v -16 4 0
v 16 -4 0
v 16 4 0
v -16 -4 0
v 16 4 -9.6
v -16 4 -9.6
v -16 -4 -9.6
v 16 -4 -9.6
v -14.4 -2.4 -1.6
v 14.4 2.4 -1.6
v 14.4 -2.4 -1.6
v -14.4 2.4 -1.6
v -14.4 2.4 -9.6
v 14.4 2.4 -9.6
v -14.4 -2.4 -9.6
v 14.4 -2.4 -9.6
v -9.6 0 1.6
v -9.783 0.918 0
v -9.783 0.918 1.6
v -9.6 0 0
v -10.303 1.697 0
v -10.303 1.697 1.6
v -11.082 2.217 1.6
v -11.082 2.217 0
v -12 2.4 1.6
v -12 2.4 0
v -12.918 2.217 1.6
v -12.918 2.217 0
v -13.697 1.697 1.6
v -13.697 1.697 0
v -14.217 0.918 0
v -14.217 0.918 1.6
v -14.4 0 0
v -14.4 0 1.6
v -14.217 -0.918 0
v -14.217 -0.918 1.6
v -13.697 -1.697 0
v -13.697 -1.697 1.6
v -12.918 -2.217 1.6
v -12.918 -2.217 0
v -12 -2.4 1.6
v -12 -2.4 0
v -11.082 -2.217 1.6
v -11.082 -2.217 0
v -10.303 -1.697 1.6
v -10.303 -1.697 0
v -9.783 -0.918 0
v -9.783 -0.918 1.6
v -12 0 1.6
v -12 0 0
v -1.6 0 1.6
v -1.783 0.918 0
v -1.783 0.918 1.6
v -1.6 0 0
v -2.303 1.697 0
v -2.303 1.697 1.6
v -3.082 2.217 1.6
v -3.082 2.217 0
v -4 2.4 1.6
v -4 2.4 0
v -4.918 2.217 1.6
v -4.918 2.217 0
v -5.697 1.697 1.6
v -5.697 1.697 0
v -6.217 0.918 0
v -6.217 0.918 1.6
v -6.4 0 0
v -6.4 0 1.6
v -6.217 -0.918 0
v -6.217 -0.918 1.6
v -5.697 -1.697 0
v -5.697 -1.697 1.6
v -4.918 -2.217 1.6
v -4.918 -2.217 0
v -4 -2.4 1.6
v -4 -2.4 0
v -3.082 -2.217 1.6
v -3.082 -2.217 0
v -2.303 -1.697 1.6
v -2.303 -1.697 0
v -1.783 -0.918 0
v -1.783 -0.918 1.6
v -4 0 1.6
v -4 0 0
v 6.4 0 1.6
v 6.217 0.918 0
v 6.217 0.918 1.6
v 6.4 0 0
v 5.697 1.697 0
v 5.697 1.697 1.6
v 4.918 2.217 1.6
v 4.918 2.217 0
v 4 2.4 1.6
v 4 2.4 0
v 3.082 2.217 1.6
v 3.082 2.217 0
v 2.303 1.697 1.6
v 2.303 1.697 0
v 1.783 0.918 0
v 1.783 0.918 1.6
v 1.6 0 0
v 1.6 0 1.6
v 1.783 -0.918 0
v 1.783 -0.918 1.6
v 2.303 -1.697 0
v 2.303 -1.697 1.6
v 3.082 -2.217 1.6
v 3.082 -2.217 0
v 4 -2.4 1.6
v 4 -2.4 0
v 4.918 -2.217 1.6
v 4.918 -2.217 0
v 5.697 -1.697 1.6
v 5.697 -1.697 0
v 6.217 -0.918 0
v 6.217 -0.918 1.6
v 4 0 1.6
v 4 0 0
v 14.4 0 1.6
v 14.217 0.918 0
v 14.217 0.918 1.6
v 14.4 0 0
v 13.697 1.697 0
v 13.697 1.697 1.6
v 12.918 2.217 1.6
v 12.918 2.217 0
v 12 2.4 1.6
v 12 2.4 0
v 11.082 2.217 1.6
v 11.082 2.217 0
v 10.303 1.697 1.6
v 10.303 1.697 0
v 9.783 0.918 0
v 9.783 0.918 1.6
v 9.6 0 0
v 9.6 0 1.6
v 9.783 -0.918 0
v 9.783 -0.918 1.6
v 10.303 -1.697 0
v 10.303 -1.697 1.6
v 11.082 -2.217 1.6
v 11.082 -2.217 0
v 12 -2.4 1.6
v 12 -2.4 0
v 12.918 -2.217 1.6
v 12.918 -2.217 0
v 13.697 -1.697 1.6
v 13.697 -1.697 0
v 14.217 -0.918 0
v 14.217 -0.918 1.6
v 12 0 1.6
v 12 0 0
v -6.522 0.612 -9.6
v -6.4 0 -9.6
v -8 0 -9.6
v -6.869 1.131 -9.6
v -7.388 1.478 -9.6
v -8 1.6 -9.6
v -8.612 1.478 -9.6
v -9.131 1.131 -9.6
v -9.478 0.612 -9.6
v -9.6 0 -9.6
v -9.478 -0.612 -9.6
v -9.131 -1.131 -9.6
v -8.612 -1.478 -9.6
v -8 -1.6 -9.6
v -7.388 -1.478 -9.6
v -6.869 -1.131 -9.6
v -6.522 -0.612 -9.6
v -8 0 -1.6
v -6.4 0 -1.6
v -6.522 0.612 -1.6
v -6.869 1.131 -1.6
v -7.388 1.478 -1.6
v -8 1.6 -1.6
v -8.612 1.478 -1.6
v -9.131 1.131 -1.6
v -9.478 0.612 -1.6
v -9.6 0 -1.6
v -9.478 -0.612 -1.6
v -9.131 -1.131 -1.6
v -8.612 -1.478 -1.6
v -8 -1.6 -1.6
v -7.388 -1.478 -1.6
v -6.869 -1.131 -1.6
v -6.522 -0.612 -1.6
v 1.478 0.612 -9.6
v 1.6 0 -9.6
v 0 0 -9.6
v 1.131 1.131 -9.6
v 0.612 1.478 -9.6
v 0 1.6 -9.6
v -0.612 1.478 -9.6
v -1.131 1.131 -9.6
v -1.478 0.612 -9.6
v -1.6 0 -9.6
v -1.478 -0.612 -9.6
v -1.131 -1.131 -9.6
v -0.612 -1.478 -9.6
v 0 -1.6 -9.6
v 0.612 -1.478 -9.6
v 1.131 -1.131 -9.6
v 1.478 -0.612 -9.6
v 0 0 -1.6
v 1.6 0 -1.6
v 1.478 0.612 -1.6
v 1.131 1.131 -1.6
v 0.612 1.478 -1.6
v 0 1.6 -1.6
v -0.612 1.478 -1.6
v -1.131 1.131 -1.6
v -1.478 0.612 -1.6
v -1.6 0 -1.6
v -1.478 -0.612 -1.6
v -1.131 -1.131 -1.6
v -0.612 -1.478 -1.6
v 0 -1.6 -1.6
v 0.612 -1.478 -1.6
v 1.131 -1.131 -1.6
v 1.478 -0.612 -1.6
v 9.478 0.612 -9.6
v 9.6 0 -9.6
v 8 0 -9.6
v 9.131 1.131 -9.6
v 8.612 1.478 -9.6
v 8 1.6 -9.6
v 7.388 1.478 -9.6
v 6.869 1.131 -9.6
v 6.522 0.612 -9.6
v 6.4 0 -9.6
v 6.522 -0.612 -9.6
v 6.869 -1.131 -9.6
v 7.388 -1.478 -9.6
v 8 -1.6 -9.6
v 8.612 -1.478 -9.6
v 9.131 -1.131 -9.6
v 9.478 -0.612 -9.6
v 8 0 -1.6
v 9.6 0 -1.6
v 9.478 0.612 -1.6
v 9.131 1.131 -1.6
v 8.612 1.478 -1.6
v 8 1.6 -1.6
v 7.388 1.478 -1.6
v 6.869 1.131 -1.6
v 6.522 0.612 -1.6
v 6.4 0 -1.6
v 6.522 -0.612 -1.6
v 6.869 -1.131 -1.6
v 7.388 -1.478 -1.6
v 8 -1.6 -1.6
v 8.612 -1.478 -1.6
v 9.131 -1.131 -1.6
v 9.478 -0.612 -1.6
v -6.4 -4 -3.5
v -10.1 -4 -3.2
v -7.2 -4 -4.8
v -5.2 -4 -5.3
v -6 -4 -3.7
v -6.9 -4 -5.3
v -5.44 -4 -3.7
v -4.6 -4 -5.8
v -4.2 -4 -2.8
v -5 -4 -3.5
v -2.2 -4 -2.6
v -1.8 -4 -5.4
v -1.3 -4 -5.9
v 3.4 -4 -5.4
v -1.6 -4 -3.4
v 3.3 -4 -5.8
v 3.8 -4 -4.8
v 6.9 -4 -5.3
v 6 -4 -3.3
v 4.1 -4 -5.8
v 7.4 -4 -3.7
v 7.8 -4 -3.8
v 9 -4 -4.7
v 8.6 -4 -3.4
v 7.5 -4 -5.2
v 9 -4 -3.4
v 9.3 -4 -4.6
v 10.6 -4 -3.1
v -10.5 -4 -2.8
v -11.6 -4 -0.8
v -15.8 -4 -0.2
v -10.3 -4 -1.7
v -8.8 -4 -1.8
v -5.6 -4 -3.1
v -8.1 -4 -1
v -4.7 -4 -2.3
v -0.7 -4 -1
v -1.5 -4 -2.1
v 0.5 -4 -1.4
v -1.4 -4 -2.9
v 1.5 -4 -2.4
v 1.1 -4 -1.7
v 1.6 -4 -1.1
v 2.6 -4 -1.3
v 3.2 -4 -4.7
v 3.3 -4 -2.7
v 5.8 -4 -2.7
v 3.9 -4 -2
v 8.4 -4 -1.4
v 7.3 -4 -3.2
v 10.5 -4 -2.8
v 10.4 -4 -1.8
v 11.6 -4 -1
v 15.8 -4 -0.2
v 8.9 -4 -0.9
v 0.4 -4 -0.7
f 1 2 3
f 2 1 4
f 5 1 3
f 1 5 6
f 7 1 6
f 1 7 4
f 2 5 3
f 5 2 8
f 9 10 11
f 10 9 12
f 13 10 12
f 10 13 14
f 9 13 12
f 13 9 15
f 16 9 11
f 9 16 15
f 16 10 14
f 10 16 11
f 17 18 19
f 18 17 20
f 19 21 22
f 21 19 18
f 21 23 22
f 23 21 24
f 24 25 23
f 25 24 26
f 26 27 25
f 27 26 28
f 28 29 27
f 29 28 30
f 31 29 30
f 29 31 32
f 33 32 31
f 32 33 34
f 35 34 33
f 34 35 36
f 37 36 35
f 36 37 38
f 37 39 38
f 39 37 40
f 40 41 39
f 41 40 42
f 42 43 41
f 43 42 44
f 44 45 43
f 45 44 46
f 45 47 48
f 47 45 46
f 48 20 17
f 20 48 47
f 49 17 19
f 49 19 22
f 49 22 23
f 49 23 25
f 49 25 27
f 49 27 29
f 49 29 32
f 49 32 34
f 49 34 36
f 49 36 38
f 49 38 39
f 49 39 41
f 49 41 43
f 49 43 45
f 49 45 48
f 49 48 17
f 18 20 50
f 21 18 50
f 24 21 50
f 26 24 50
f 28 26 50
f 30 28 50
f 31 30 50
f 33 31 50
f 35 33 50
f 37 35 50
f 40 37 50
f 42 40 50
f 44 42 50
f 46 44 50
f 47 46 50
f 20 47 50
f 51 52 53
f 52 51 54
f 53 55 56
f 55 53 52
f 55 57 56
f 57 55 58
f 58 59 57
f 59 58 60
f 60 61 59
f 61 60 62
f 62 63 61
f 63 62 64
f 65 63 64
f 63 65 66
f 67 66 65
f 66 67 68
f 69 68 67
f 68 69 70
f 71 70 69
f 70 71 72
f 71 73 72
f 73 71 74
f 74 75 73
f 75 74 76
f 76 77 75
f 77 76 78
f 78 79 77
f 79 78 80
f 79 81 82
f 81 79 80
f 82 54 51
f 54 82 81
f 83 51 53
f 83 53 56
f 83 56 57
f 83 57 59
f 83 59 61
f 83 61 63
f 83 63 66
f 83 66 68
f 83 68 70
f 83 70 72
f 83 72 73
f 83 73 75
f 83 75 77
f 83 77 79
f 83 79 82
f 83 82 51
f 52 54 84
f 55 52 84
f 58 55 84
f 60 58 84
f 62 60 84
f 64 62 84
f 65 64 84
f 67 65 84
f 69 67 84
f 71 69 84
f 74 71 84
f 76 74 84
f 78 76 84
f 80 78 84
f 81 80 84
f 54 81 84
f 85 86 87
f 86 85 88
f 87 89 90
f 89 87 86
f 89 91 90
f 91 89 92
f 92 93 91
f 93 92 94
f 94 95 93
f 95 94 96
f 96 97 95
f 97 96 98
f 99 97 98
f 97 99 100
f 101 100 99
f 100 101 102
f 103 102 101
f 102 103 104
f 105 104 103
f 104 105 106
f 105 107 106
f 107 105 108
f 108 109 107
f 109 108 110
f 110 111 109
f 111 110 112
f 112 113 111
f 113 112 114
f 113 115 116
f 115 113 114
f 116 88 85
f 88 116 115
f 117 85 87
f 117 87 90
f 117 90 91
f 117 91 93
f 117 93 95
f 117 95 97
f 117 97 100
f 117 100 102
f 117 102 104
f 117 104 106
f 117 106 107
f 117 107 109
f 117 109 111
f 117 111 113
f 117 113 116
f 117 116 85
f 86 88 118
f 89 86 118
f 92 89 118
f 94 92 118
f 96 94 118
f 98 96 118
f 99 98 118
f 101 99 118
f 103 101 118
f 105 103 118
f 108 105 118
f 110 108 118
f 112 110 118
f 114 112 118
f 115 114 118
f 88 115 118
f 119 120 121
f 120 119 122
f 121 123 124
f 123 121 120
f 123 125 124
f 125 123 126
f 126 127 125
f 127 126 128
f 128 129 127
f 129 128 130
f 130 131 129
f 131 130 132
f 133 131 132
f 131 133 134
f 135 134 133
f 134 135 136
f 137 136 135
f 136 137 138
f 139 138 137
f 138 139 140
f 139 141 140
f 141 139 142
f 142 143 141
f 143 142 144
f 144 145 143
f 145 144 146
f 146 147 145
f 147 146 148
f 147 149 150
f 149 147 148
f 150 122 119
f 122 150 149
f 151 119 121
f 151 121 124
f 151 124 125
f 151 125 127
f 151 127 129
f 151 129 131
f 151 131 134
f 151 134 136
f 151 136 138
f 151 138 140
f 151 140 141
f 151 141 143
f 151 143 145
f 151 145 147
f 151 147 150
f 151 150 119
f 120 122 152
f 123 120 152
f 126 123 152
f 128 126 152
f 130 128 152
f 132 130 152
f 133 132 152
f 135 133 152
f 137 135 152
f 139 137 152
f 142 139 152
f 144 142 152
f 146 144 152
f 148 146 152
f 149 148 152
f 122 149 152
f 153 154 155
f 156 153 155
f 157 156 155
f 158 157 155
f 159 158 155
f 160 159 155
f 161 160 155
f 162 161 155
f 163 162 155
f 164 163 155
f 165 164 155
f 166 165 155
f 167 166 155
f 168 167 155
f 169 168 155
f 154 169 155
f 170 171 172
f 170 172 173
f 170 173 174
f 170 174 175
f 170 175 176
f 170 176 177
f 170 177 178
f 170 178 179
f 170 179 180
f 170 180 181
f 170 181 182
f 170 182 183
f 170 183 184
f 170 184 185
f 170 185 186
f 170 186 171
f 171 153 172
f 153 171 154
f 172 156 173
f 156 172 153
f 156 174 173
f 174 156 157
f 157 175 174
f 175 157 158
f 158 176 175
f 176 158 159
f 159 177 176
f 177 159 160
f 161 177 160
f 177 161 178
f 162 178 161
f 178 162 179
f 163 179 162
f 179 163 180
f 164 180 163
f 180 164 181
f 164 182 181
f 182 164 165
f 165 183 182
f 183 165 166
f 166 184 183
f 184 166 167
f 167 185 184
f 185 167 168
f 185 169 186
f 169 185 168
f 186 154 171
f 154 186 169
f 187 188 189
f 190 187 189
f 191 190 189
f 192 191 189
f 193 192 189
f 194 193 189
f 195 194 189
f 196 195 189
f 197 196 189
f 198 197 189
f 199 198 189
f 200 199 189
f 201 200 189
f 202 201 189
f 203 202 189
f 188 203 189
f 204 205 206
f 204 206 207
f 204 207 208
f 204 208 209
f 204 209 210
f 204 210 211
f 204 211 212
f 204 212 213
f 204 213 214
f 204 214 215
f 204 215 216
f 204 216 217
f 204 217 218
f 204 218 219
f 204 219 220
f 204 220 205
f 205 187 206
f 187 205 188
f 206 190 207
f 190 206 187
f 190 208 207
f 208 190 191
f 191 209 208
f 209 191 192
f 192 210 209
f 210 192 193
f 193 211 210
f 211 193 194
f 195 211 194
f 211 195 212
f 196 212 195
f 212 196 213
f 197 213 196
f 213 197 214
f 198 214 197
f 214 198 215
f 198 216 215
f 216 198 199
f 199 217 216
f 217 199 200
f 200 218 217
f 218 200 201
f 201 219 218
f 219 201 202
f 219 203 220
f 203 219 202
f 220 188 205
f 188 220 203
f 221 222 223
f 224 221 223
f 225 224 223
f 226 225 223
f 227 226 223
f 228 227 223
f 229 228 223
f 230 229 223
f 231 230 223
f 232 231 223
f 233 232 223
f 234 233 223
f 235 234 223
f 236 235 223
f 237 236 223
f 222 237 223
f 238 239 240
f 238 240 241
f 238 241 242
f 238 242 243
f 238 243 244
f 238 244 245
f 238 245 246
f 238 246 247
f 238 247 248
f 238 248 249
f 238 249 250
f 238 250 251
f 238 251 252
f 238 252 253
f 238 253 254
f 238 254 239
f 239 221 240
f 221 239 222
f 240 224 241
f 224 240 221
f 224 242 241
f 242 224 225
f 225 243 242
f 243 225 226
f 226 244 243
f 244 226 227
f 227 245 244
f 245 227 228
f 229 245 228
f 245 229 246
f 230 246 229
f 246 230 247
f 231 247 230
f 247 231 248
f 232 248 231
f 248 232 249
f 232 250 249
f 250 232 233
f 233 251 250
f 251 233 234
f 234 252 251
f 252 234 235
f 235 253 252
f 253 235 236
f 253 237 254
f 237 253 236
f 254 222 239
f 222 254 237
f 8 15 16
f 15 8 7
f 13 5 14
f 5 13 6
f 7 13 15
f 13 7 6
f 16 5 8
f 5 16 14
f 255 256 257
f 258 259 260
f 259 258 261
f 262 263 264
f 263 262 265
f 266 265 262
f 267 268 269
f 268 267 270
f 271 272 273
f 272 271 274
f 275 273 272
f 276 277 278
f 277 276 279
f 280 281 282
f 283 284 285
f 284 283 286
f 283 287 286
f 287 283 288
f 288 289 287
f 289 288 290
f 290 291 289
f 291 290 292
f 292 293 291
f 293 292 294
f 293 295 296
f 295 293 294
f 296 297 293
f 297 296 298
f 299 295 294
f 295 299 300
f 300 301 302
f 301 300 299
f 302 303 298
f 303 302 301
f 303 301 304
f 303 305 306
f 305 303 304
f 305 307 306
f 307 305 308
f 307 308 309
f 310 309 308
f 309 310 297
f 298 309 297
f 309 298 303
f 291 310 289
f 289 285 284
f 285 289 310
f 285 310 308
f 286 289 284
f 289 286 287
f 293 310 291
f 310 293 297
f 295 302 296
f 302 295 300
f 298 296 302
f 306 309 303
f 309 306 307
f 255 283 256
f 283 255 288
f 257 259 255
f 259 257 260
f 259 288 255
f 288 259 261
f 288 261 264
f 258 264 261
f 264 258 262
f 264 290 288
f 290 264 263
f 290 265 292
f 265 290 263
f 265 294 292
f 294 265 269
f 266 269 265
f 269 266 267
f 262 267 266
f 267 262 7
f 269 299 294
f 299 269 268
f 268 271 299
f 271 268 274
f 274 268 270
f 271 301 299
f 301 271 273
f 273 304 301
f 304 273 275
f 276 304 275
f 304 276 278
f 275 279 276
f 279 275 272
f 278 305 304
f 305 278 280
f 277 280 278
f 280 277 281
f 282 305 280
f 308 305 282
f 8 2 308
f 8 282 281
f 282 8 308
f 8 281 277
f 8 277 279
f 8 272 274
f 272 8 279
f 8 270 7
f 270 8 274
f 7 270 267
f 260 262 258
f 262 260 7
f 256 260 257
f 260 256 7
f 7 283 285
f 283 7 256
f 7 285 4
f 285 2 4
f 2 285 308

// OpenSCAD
// file: ../p/4-4edge.scad
use <../lib.scad>
function ldraw_lib__4_4edge() = [
// 0 Circle 1.0
// 0 Name: 4-4edge.dat
// 0 Author: James Jessiman
// 0 !LDRAW_ORG Primitive UPDATE 2017-01
// 0 !LICENSE Licensed under CC BY 2.0 and CC BY 4.0 : see CAreadme.txt
// 
// 0 BFC CERTIFY CCW
  [0,"BFC","CERTIFY"],
  [0,"BFC","CCW"],
// 
// 0 !HISTORY 1998-12-15 [PTadmin] Official Update 1998-10
// 0 !HISTORY 2005-12-28 [PTadmin] Official Update 2005-01
// 0 !HISTORY 2007-06-24 [PTadmin] Header formatted for Contributor Agreement
// 0 !HISTORY 2008-07-01 [PTadmin] Official Update 2008-01
// 0 !HISTORY 2017-01-15 [Steffen] BFCed
// 0 !HISTORY 2017-12-30 [PTadmin] Official Update 2017-01
// 
// 
// 2 24 1 0 0 0.9239 0 0.3827
  [2,24,1,0,0,0.9239,0,0.3827],
// 2 24 0.9239 0 0.3827 0.7071 0 0.7071
  [2,24,0.9239,0,0.3827,0.7071,0,0.7071],
// 2 24 0.7071 0 0.7071 0.3827 0 0.9239
  [2,24,0.7071,0,0.7071,0.3827,0,0.9239],
// 2 24 0.3827 0 0.9239 0 0 1
  [2,24,0.3827,0,0.9239,0,0,1],
// 2 24 0 0 1 -0.3827 0 0.9239
  [2,24,0,0,1,-0.3827,0,0.9239],
// 2 24 -0.3827 0 0.9239 -0.7071 0 0.7071
  [2,24,-0.3827,0,0.9239,-0.7071,0,0.7071],
// 2 24 -0.7071 0 0.7071 -0.9239 0 0.3827
  [2,24,-0.7071,0,0.7071,-0.9239,0,0.3827],
// 2 24 -0.9239 0 0.3827 -1 0 -0
  [2,24,-0.9239,0,0.3827,-1,0,-0],
// 2 24 -1 0 -0 -0.9239 0 -0.3827
  [2,24,-1,0,-0,-0.9239,0,-0.3827],
// 2 24 -0.9239 0 -0.3827 -0.7071 0 -0.7071
  [2,24,-0.9239,0,-0.3827,-0.7071,0,-0.7071],
// 2 24 -0.7071 0 -0.7071 -0.3827 0 -0.9239
  [2,24,-0.7071,0,-0.7071,-0.3827,0,-0.9239],
// 2 24 -0.3827 0 -0.9239 0 0 -1
  [2,24,-0.3827,0,-0.9239,0,0,-1],
// 2 24 0 0 -1 0.3827 0 -0.9239
  [2,24,0,0,-1,0.3827,0,-0.9239],
// 2 24 0.3827 0 -0.9239 0.7071 0 -0.7071
  [2,24,0.3827,0,-0.9239,0.7071,0,-0.7071],
// 2 24 0.7071 0 -0.7071 0.9239 0 -0.3827
  [2,24,0.7071,0,-0.7071,0.9239,0,-0.3827],
// 2 24 0.9239 0 -0.3827 1 0 0
  [2,24,0.9239,0,-0.3827,1,0,0],
];
module ldraw_lib__4_4edge(step=0, col=false, unit=2/5, alt=false, line=0.2, solid=!$preview)
    makepoly(ldraw_lib__4_4edge(), step=step, col=col, unit=unit, alt=alt, line=line, solid=solid);
ldraw_lib__4_4edge(line=0.2);
// file: ../p/4-4disc.scad
use <../lib.scad>
function ldraw_lib__4_4disc() = [
// 0 Disc 1.0
// 0 Name: 4-4disc.dat
// 0 Author: James Jessiman
// 0 !LDRAW_ORG Primitive UPDATE 2002-02
// 0 !LICENSE Licensed under CC BY 2.0 and CC BY 4.0 : see CAreadme.txt
// 
// 0 BFC CERTIFY CCW
  [0,"BFC","CERTIFY"],
  [0,"BFC","CCW"],
// 
// 0 !HISTORY 1998-12-15 [PTadmin] Official Update 1998-10
// 0 !HISTORY 2002-03-23 [sbliss] Added BFC statement
// 0 !HISTORY 2002-04-25 [PTadmin] Official Update 2002-02
// 0 !HISTORY 2007-06-24 [PTadmin] Header formatted for Contributor Agreement
// 0 !HISTORY 2008-07-01 [PTadmin] Official Update 2008-01
// 
// 
// 3 16 0 0 0 1 0 0 0.9239 0 0.3827
  [3,16,0,0,0,1,0,0,0.9239,0,0.3827],
// 3 16 0 0 0 0.9239 0 0.3827 0.7071 0 0.7071
  [3,16,0,0,0,0.9239,0,0.3827,0.7071,0,0.7071],
// 3 16 0 0 0 0.7071 0 0.7071 0.3827 0 0.9239
  [3,16,0,0,0,0.7071,0,0.7071,0.3827,0,0.9239],
// 3 16 0 0 0 0.3827 0 0.9239 0 0 1
  [3,16,0,0,0,0.3827,0,0.9239,0,0,1],
// 3 16 0 0 0 0 0 1 -0.3827 0 0.9239
  [3,16,0,0,0,0,0,1,-0.3827,0,0.9239],
// 3 16 0 0 0 -0.3827 0 0.9239 -0.7071 0 0.7071
  [3,16,0,0,0,-0.3827,0,0.9239,-0.7071,0,0.7071],
// 3 16 0 0 0 -0.7071 0 0.7071 -0.9239 0 0.3827
  [3,16,0,0,0,-0.7071,0,0.7071,-0.9239,0,0.3827],
// 3 16 0 0 0 -0.9239 0 0.3827 -1 0 -0
  [3,16,0,0,0,-0.9239,0,0.3827,-1,0,-0],
// 3 16 0 0 0 -1 0 -0 -0.9239 0 -0.3827
  [3,16,0,0,0,-1,0,-0,-0.9239,0,-0.3827],
// 3 16 0 0 0 -0.9239 0 -0.3827 -0.7071 0 -0.7071
  [3,16,0,0,0,-0.9239,0,-0.3827,-0.7071,0,-0.7071],
// 3 16 0 0 0 -0.7071 0 -0.7071 -0.3827 0 -0.9239
  [3,16,0,0,0,-0.7071,0,-0.7071,-0.3827,0,-0.9239],
// 3 16 0 0 0 -0.3827 0 -0.9239 0 0 -1
  [3,16,0,0,0,-0.3827,0,-0.9239,0,0,-1],
// 3 16 0 0 0 0 0 -1 0.3827 0 -0.9239
  [3,16,0,0,0,0,0,-1,0.3827,0,-0.9239],
// 3 16 0 0 0 0.3827 0 -0.9239 0.7071 0 -0.7071
  [3,16,0,0,0,0.3827,0,-0.9239,0.7071,0,-0.7071],
// 3 16 0 0 0 0.7071 0 -0.7071 0.9239 0 -0.3827
  [3,16,0,0,0,0.7071,0,-0.7071,0.9239,0,-0.3827],
// 3 16 0 0 0 0.9239 0 -0.3827 1 0 0
  [3,16,0,0,0,0.9239,0,-0.3827,1,0,0],
// 0
];
module ldraw_lib__4_4disc(step=0, col=false, unit=2/5, alt=false, line=0.2, solid=!$preview)
    makepoly(ldraw_lib__4_4disc(), step=step, col=col, unit=unit, alt=alt, line=line, solid=solid);
ldraw_lib__4_4disc(line=0.2);
// file: ../p/4-4cyli.scad
use <../lib.scad>
$fa=1; $fs=0.2;
function ldraw_lib__4_4cyli(realsolid=false) = [
// 0 Cylinder 1.0
// 0 Name: 4-4cyli.dat
// 0 Author: James Jessiman
// 0 !LDRAW_ORG Primitive UPDATE 2005-01
// 0 !LICENSE Licensed under CC BY 2.0 and CC BY 4.0 : see CAreadme.txt
// 
// 0 BFC CERTIFY CCW
  [0,"BFC","CERTIFY"],
  [0,"BFC","CCW"],
// 
// 0 !HISTORY 1998-12-15 [PTadmin] Official Update 1998-10
// 0 !HISTORY 2002-03-23 [sbliss] Added BFC statement; merged headers from files in distributions LDraw 0.27 and Complete.
// 0 !HISTORY 2002-04-25 [PTadmin] Official Update 2002-02
// 0 !HISTORY 2004-12-14 [guyvivan] BFC CCW
// 0 !HISTORY 2005-12-28 [PTadmin] Official Update 2005-01
// 0 !HISTORY 2007-06-24 [PTadmin] Header formatted for Contributor Agreement
// 0 !HISTORY 2008-07-01 [PTadmin] Official Update 2008-01
// 
// 
// 4 16 1 1 0 0.9239 1 0.3827 0.9239 0 0.3827 1 0 0
  [4,16,1,1,0,0.9239,1,0.3827,0.9239,0,0.3827,1,0,0],
// 5 24 1 0 0 1 1 0 0.9239 0 0.3827 0.9239 0 -0.3827
  [5,24,1,0,0,1,1,0,0.9239,0,0.3827,0.9239,0,-0.3827],
// 4 16 0.9239 1 0.3827 0.7071 1 0.7071 0.7071 0 0.7071 0.9239 0 0.3827
  [4,16,0.9239,1,0.3827,0.7071,1,0.7071,0.7071,0,0.7071,0.9239,0,0.3827],
// 5 24 0.9239 0 0.3827 0.9239 1 0.3827 0.7071 0 0.7071 1 0 0
  [5,24,0.9239,0,0.3827,0.9239,1,0.3827,0.7071,0,0.7071,1,0,0],
// 4 16 0.7071 1 0.7071 0.3827 1 0.9239 0.3827 0 0.9239 0.7071 0 0.7071
  [4,16,0.7071,1,0.7071,0.3827,1,0.9239,0.3827,0,0.9239,0.7071,0,0.7071],
// 5 24 0.7071 0 0.7071 0.7071 1 0.7071 0.3827 0 0.9239 0.9239 0 0.3827
  [5,24,0.7071,0,0.7071,0.7071,1,0.7071,0.3827,0,0.9239,0.9239,0,0.3827],
// 4 16 0.3827 1 0.9239 0 1 1 0 0 1 0.3827 0 0.9239
  [4,16,0.3827,1,0.9239,0,1,1,0,0,1,0.3827,0,0.9239],
// 5 24 0.3827 0 0.9239 0.3827 1 0.9239 0 0 1 0.7071 0 0.7071
  [5,24,0.3827,0,0.9239,0.3827,1,0.9239,0,0,1,0.7071,0,0.7071],
// 4 16 0 1 1 -0.3827 1 0.9239 -0.3827 0 0.9239 0 0 1
  [4,16,0,1,1,-0.3827,1,0.9239,-0.3827,0,0.9239,0,0,1],
// 5 24 0 0 1 0 1 1 -0.3827 0 0.9239 0.3827 0 0.9239
  [5,24,0,0,1,0,1,1,-0.3827,0,0.9239,0.3827,0,0.9239],
// 4 16 -0.3827 1 0.9239 -0.7071 1 0.7071 -0.7071 0 0.7071 -0.3827 0 0.9239
  [4,16,-0.3827,1,0.9239,-0.7071,1,0.7071,-0.7071,0,0.7071,-0.3827,0,0.9239],
// 5 24 -0.3827 0 0.9239 -0.3827 1 0.9239 -0.7071 0 0.7071 0 0 1
  [5,24,-0.3827,0,0.9239,-0.3827,1,0.9239,-0.7071,0,0.7071,0,0,1],
// 4 16 -0.7071 1 0.7071 -0.9239 1 0.3827 -0.9239 0 0.3827 -0.7071 0 0.7071
  [4,16,-0.7071,1,0.7071,-0.9239,1,0.3827,-0.9239,0,0.3827,-0.7071,0,0.7071],
// 5 24 -0.7071 0 0.7071 -0.7071 1 0.7071 -0.9239 0 0.3827 -0.3827 0 0.9239
  [5,24,-0.7071,0,0.7071,-0.7071,1,0.7071,-0.9239,0,0.3827,-0.3827,0,0.9239],
// 4 16 -0.9239 1 0.3827 -1 1 0 -1 0 0 -0.9239 0 0.3827
  [4,16,-0.9239,1,0.3827,-1,1,0,-1,0,0,-0.9239,0,0.3827],
// 5 24 -0.9239 0 0.3827 -0.9239 1 0.3827 -1 0 0 -0.7071 0 0.7071
  [5,24,-0.9239,0,0.3827,-0.9239,1,0.3827,-1,0,0,-0.7071,0,0.7071],
// 4 16 -1 1 0 -0.9239 1 -0.3827 -0.9239 0 -0.3827 -1 0 0
  [4,16,-1,1,0,-0.9239,1,-0.3827,-0.9239,0,-0.3827,-1,0,0],
// 5 24 -1 0 0 -1 1 0 -0.9239 0 -0.3827 -0.9239 0 0.3827
  [5,24,-1,0,0,-1,1,0,-0.9239,0,-0.3827,-0.9239,0,0.3827],
// 4 16 -0.9239 1 -0.3827 -0.7071 1 -0.7071 -0.7071 0 -0.7071 -0.9239 0 -0.3827
  [4,16,-0.9239,1,-0.3827,-0.7071,1,-0.7071,-0.7071,0,-0.7071,-0.9239,0,-0.3827],
// 5 24 -0.9239 0 -0.3827 -0.9239 1 -0.3827 -0.7071 0 -0.7071 -1 0 0
  [5,24,-0.9239,0,-0.3827,-0.9239,1,-0.3827,-0.7071,0,-0.7071,-1,0,0],
// 4 16 -0.7071 1 -0.7071 -0.3827 1 -0.9239 -0.3827 0 -0.9239 -0.7071 0 -0.7071
  [4,16,-0.7071,1,-0.7071,-0.3827,1,-0.9239,-0.3827,0,-0.9239,-0.7071,0,-0.7071],
// 5 24 -0.7071 0 -0.7071 -0.7071 1 -0.7071 -0.3827 0 -0.9239 -0.9239 0 -0.3827
  [5,24,-0.7071,0,-0.7071,-0.7071,1,-0.7071,-0.3827,0,-0.9239,-0.9239,0,-0.3827],
// 4 16 -0.3827 1 -0.9239 0 1 -1 0 0 -1 -0.3827 0 -0.9239
  [4,16,-0.3827,1,-0.9239,0,1,-1,0,0,-1,-0.3827,0,-0.9239],
// 5 24 -0.3827 0 -0.9239 -0.3827 1 -0.9239 0 0 -1 -0.7071 0 -0.7071
  [5,24,-0.3827,0,-0.9239,-0.3827,1,-0.9239,0,0,-1,-0.7071,0,-0.7071],
// 4 16 0 1 -1 0.3827 1 -0.9239 0.3827 0 -0.9239 0 0 -1
  [4,16,0,1,-1,0.3827,1,-0.9239,0.3827,0,-0.9239,0,0,-1],
// 5 24 0 0 -1 0 1 -1 0.3827 0 -0.9239 -0.3827 0 -0.9239
  [5,24,0,0,-1,0,1,-1,0.3827,0,-0.9239,-0.3827,0,-0.9239],
// 4 16 0.3827 1 -0.9239 0.7071 1 -0.7071 0.7071 0 -0.7071 0.3827 0 -0.9239
  [4,16,0.3827,1,-0.9239,0.7071,1,-0.7071,0.7071,0,-0.7071,0.3827,0,-0.9239],
// 5 24 0.3827 0 -0.9239 0.3827 1 -0.9239 0.7071 0 -0.7071 0 0 -1
  [5,24,0.3827,0,-0.9239,0.3827,1,-0.9239,0.7071,0,-0.7071,0,0,-1],
// 4 16 0.7071 1 -0.7071 0.9239 1 -0.3827 0.9239 0 -0.3827 0.7071 0 -0.7071
  [4,16,0.7071,1,-0.7071,0.9239,1,-0.3827,0.9239,0,-0.3827,0.7071,0,-0.7071],
// 5 24 0.7071 0 -0.7071 0.7071 1 -0.7071 0.9239 0 -0.3827 0.3827 0 -0.9239
  [5,24,0.7071,0,-0.7071,0.7071,1,-0.7071,0.9239,0,-0.3827,0.3827,0,-0.9239],
// 4 16 0.9239 1 -0.3827 1 1 0 1 0 0 0.9239 0 -0.3827
  [4,16,0.9239,1,-0.3827,1,1,0,1,0,0,0.9239,0,-0.3827],
// 5 24 0.9239 0 -0.3827 0.9239 1 -0.3827 1 0 0 0.7071 0 -0.7071
  [5,24,0.9239,0,-0.3827,0.9239,1,-0.3827,1,0,0,0.7071,0,-0.7071],
// 0
];
module ldraw_lib__4_4cyli(step=0, col=false, unit=2/5, alt=false, line=0.2, solid=!$preview)
    makepoly(ldraw_lib__4_4cyli(solid), step=step, col=col, unit=unit, alt=alt, line=line, solid=solid);
ldraw_lib__4_4cyli(line=0.2);
// file: ../p/stud3.scad
use <../lib.scad>
use <4-4cyli.scad>
use <4-4disc.scad>
use <4-4edge.scad>
function ldraw_lib__stud3() = [
// 0 Stud Tube Solid
// 0 Name: stud3.dat
// 0 Author: James Jessiman
// 0 !LDRAW_ORG Primitive UPDATE 2012-01
// 0 !LICENSE Licensed under CC BY 4.0 : see CAreadme.txt
// 
// 0 BFC CERTIFY CCW
  [0,"BFC","CERTIFY"],
  [0,"BFC","CCW"],
// 
// 0 !HISTORY 2002-04-04 [sbliss] Modified for BFC compliance
// 0 !HISTORY 2002-04-25 [PTadmin] Official Update 2002-02
// 0 !HISTORY 2007-06-24 [PTadmin] Header formatted for Contributor Agreement
// 0 !HISTORY 2008-07-01 [PTadmin] Official Update 2008-01
// 0 !HISTORY 2012-02-16 [Philo] Changed to CCW
// 0 !HISTORY 2012-03-30 [PTadmin] Official Update 2012-01
// 
// 
// 1 16 0 -4 0 4 0 0 0 1 0 0 0 4 4-4edge.dat
  [1,16,0,-4,0,4,0,0,0,1,0,0,0,4, ldraw_lib__4_4edge()],
// 1 16 0 0 0 4 0 0 0 1 0 0 0 4 4-4edge.dat
  [1,16,0,0,0,4,0,0,0,1,0,0,0,4, ldraw_lib__4_4edge()],
// 1 16 0 -4 0 4 0 0 0 1 0 0 0 4 4-4disc.dat
  [1,16,0,-4,0,4,0,0,0,1,0,0,0,4, ldraw_lib__4_4disc()],
  [-1,16,0,0,0,4,0,0,0,-1,0,0,0,4, ldraw_lib__4_4disc()],
// 1 16 0 -4 0 4 0 0 0 4 0 0 0 4 4-4cyli.dat
  [1,16,0,-4,0,4,0,0,0,4,0,0,0,4, ldraw_lib__4_4cyli()],
];
module ldraw_lib__stud3(step=0, col=false, unit=2/5, alt=false, line=0.2, solid=!$preview)
    makepoly(ldraw_lib__stud3(), step=step, col=col, unit=unit, alt=alt, line=line, solid=solid);
ldraw_lib__stud3(line=0.2);
// file: ../p/stud.scad
use <../lib.scad>
use <4-4cyli.scad>
use <4-4disc.scad>
use <4-4edge.scad>
function ldraw_lib__stud() = [
// 0 Stud
// 0 Name: stud.dat
// 0 Author: James Jessiman
// 0 !LDRAW_ORG Primitive UPDATE 2012-01
// 0 !LICENSE Licensed under CC BY 4.0 : see CAreadme.txt
// 
// 0 BFC CERTIFY CCW
  [0,"BFC","CERTIFY"],
  [0,"BFC","CCW"],
// 
// 0 !HISTORY 2002-04-04 [sbliss] Modified for BFC compliance
// 0 !HISTORY 2002-04-25 [PTadmin] Official Update 2002-02
// 0 !HISTORY 2007-06-24 [PTadmin] Header formatted for Contributor Agreement
// 0 !HISTORY 2008-07-01 [PTadmin] Official Update 2008-01
// 0 !HISTORY 2012-02-16 [Philo] Changed to CCW
// 0 !HISTORY 2012-03-30 [PTadmin] Official Update 2012-01
// 
// 
// 1 16 0 0 0 6 0 0 0 1 0 0 0 6 4-4edge.dat
  [1,16,0,0,0,6,0,0,0,1,0,0,0,6, ldraw_lib__4_4edge()],
// 1 16 0 -4 0 6 0 0 0 1 0 0 0 6 4-4edge.dat
  [1,16,0,-4,0,6,0,0,0,1,0,0,0,6, ldraw_lib__4_4edge()],
// 1 16 0 0 0 6 0 0 0 -4 0 0 0 6 4-4cyli.dat
  [1,16,0,0,0,6,0,0,0,-4,0,0,0,6, ldraw_lib__4_4cyli()],
// 1 16 0 -4 0 6 0 0 0 1 0 0 0 6 4-4disc.dat
  [1,16,0,-4,0,6,0,0,0,1,0,0,0,6, ldraw_lib__4_4disc()],
  [-1,16,0,0,0,6,0,0,0,-1,0,0,0,6, ldraw_lib__4_4disc()],
];
module ldraw_lib__stud(step=0, col=false, unit=2/5, alt=false, line=0.2, solid=!$preview)
    makepoly(ldraw_lib__stud(), step=step, col=col, unit=unit, alt=alt, line=line, solid=solid);
ldraw_lib__stud(line=0.2);
// file: ../p/box5.scad
use <../lib.scad>
function ldraw_lib__box5() = [
// 0 Box with 5 Faces and All Edges
// 0 Name: box5.dat
// 0 Author: James Jessiman
// 0 !LDRAW_ORG Primitive UPDATE 2012-01
// 0 !LICENSE Licensed under CC BY 2.0 and CC BY 4.0 : see CAreadme.txt
// 
// 0 BFC CERTIFY CCW
  [0,"BFC","CERTIFY"],
  [0,"BFC","CCW"],
// 
// 0 !HISTORY 2002-04-03 [sbliss] Modified for BFC compliance
// 0 !HISTORY 2002-04-25 [PTadmin] Official Update 2002-02
// 0 !HISTORY 2007-06-24 [PTadmin] Header formatted for Contributor Agreement
// 0 !HISTORY 2008-07-01 [PTadmin] Official Update 2008-01
// 0 !HISTORY 2012-02-16 [Philo] Changed to CCW
// 0 !HISTORY 2012-03-30 [PTadmin] Official Update 2012-01
// 
// 
// 2 24 1 1 1 -1 1 1
  [2,24,1,1,1,-1,1,1],
// 2 24 -1 1 1 -1 1 -1
  [2,24,-1,1,1,-1,1,-1],
// 2 24 -1 1 -1 1 1 -1
  [2,24,-1,1,-1,1,1,-1],
// 2 24 1 1 -1 1 1 1
  [2,24,1,1,-1,1,1,1],
// 2 24 1 0 1 -1 0 1
  [2,24,1,0,1,-1,0,1],
// 2 24 -1 0 1 -1 0 -1
  [2,24,-1,0,1,-1,0,-1],
// 2 24 -1 0 -1 1 0 -1
  [2,24,-1,0,-1,1,0,-1],
// 2 24 1 0 -1 1 0 1
  [2,24,1,0,-1,1,0,1],
// 2 24 1 0 1 1 1 1
  [2,24,1,0,1,1,1,1],
// 2 24 -1 0 1 -1 1 1
  [2,24,-1,0,1,-1,1,1],
// 2 24 1 0 -1 1 1 -1
  [2,24,1,0,-1,1,1,-1],
// 2 24 -1 0 -1 -1 1 -1
  [2,24,-1,0,-1,-1,1,-1],
// 4 16 -1 1 1 1 1 1 1 1 -1 -1 1 -1
  [4,16,-1,1,1,1,1,1,1,1,-1,-1,1,-1],
// 4 16 -1 1 1 -1 0 1 1 0 1 1 1 1
  [4,16,-1,1,1,-1,0,1,1,0,1,1,1,1],
// 4 16 -1 1 -1 -1 0 -1 -1 0 1 -1 1 1
  [4,16,-1,1,-1,-1,0,-1,-1,0,1,-1,1,1],
// 4 16 1 1 -1 1 0 -1 -1 0 -1 -1 1 -1
  [4,16,1,1,-1,1,0,-1,-1,0,-1,-1,1,-1],
// 4 16 1 1 1 1 0 1 1 0 -1 1 1 -1
  [4,16,1,1,1,1,0,1,1,0,-1,1,1,-1],
];
makepoly(ldraw_lib__box5(), line=0.2);
// file: ../p/box4t.scad
use <../lib.scad>
function ldraw_lib__box4t() = [
// 0 Box with 4 Adjacent Faces and All Edges
// 0 Name: box4t.dat
// 0 Author: Tore Eriksson [Tore_Eriksson]
// 0 !LDRAW_ORG Primitive UPDATE 2003-02
// 0 !LICENSE Licensed under CC BY 2.0 and CC BY 4.0 : see CAreadme.txt
// 
// 0 BFC CERTIFY CCW
  [0,"BFC","CERTIFY"],
  [0,"BFC","CCW"],
// 
// 0 !HISTORY 1997-09-29 [PTadmin] Official Update 1997-15
// 0 !HISTORY 2002-08-31 [izanette] Modified with WINDZ for BFC compliance
// 0 !HISTORY 2003-08-01 [PTadmin] Official Update 2003-02
// 0 !HISTORY 2007-06-24 [PTadmin] Header formatted for Contributor Agreement
// 0 !HISTORY 2008-07-01 [PTadmin] Official Update 2008-01
// 
// 
// 2 24 1 1 1 -1 1 1
  [2,24,1,1,1,-1,1,1],
// 2 24 -1 1 1 -1 1 -1
  [2,24,-1,1,1,-1,1,-1],
// 2 24 -1 1 -1 1 1 -1
  [2,24,-1,1,-1,1,1,-1],
// 2 24 1 1 -1 1 1 1
  [2,24,1,1,-1,1,1,1],
// 2 24 1 0 1 -1 0 1
  [2,24,1,0,1,-1,0,1],
// 2 24 -1 0 1 -1 0 -1
  [2,24,-1,0,1,-1,0,-1],
// 2 24 -1 0 -1 1 0 -1
  [2,24,-1,0,-1,1,0,-1],
// 2 24 1 0 -1 1 0 1
  [2,24,1,0,-1,1,0,1],
// 2 24 1 0 1 1 1 1
  [2,24,1,0,1,1,1,1],
// 2 24 -1 0 1 -1 1 1
  [2,24,-1,0,1,-1,1,1],
// 2 24 1 0 -1 1 1 -1
  [2,24,1,0,-1,1,1,-1],
// 2 24 -1 0 -1 -1 1 -1
  [2,24,-1,0,-1,-1,1,-1],
// 4 16 1 1 1 1 1 -1 -1 1 -1 -1 1 1
  [4,16,1,1,1,1,1,-1,-1,1,-1,-1,1,1],
// 4 16 1 1 1 -1 1 1 -1 0 1 1 0 1
  [4,16,1,1,1,-1,1,1,-1,0,1,1,0,1],
// 4 16 -1 1 1 -1 1 -1 -1 0 -1 -1 0 1
  [4,16,-1,1,1,-1,1,-1,-1,0,-1,-1,0,1],
// 0 4 16 -1 1 -1 -1 0 -1 1 0 -1 1 1 -1
// 4 16 1 1 -1 1 1 1 1 0 1 1 0 -1
  [4,16,1,1,-1,1,1,1,1,0,1,1,0,-1],
// 0
];
makepoly(ldraw_lib__box4t(), line=0.2);
// file: s/3010s01.scad
use <../../lib.scad>
use <../../p/box4t.scad>
use <../../p/box5.scad>
use <../../p/stud.scad>
use <../../p/stud3.scad>
$fa=1; $fs=0.2;
function ldraw_lib__s__3010s01(realsolid=false) = [
// 0 ~Brick  1 x  4 without Front Face
// 0 Name: s\3010s01.dat
// 0 Author: Tony Hafner [hafhead]
// 0 !LDRAW_ORG Subpart UPDATE 2003-02
// 0 !LICENSE Licensed under CC BY 2.0 and CC BY 4.0 : see CAreadme.txt
// 
// 0 BFC CERTIFY CW
  [0,"BFC","CERTIFY"],
  [0,"BFC","CW"],
// 
// 0 !HISTORY 2003-08-01 [PTadmin] Official Update 2003-02
// 0 !HISTORY 2007-08-29 [PTadmin] Header formatted for Contributor Agreement
// 0 !HISTORY 2008-07-01 [PTadmin] Official Update 2008-01
// 
// 
// 1 16 0 24 0 40 0 0 0 -24 0 0 0 10 box4t.dat
  [1,16,0,24,0,40,0,0,0,-24,0,0,0,10, ldraw_lib__box4t(realsolid)],
// 0 BFC INVERTNEXT
  [0,"BFC","INVERTNEXT"],
// 1 16 0 24 0 36 0 0 0 -20 0 0 0 6 box5.dat
  [1,16,0,24,0,36,0,0,0,-20,0,0,0,6, ldraw_lib__box5(realsolid)],
// 1 16 -30 0 0 1 0 0 0 1 0 0 0 1 stud.dat
  [1,16,-30,0,0,1,0,0,0,1,0,0,0,1, ldraw_lib__stud(realsolid)],
// 1 16 -10 0 0 1 0 0 0 1 0 0 0 1 stud.dat
  [1,16,-10,0,0,1,0,0,0,1,0,0,0,1, ldraw_lib__stud(realsolid)],
// 1 16 10 0 0 1 0 0 0 1 0 0 0 1 stud.dat
  [1,16,10,0,0,1,0,0,0,1,0,0,0,1, ldraw_lib__stud(realsolid)],
// 1 16 30 0 0 1 0 0 0 1 0 0 0 1 stud.dat
  [1,16,30,0,0,1,0,0,0,1,0,0,0,1, ldraw_lib__stud(realsolid)],
// 1 16 -20 4 0 1 0 0 0 -5 0 0 0 1 stud3.dat
  [1,16,-20,4,0,1,0,0,0,-5,0,0,0,1, ldraw_lib__stud3(realsolid)],
// 1 16 0 4 0 1 0 0 0 -5 0 0 0 1 stud3.dat
  [1,16,0,4,0,1,0,0,0,-5,0,0,0,1, ldraw_lib__stud3(realsolid)],
// 1 16 20 4 0 1 0 0 0 -5 0 0 0 1 stud3.dat
  [1,16,20,4,0,1,0,0,0,-5,0,0,0,1, ldraw_lib__stud3(realsolid)],
// 4 16 -40 24 -10 40 24 -10 36 24 -6 -36 24 -6
  [4,16,-40,24,-10,40,24,-10,36,24,-6,-36,24,-6],
// 4 16 -40 24 10 -36 24 6 36 24 6 40 24 10
  [4,16,-40,24,10,-36,24,6,36,24,6,40,24,10],
// 4 16 -40 24 -10 -36 24 -6 -36 24 6 -40 24 10
  [4,16,-40,24,-10,-36,24,-6,-36,24,6,-40,24,10],
// 4 16 40 24 -10 40 24 10 36 24 6 36 24 -6
  [4,16,40,24,-10,40,24,10,36,24,6,36,24,-6],
// 0
];
module ldraw_lib__s__3010s01(step=0, col=false, unit=2/5, alt=false, line=0.2, solid=!$preview)
    makepoly(ldraw_lib__s__3010s01(solid), step=step, col=col, unit=unit, alt=alt, line=line, solid=solid);
ldraw_lib__s__3010s01(line=0.2);
// main file
use <../lib.scad>
use <s/3010s01.scad>
function ldraw_lib__3010py1() = [
// 0 Brick  1 x  4 with Dark Green Reptile Scale Pattern
// 0 Name: 3010py1.dat
// 0 Author: Vincent Messenet [Cheenzo]
// 0 !LDRAW_ORG Part UPDATE 2020-02
// 0 !LICENSE Licensed under CC BY 4.0 : see CAreadme.txt
// 
// 0 BFC CERTIFY CCW
  [0,"BFC","CERTIFY"],
  [0,"BFC","CCW"],
// 
// 0 !KEYWORDS Blue, Brickheadz, BrickLink 3010pb230, Jurassic world
// 0 !KEYWORDS Rebrickable 3010pr0043, Set 41614
// 
// 0 !HISTORY 2020-09-05 [PTadmin] Official Update 2020-02
// 
// 
// 1 16 0 0 0 1 0 0 0 1 0 0 0 1 s\3010s01.dat
  [1,16,0,0,0,1,0,0,0,1,0,0,0,1, ldraw_lib__s__3010s01()],
// 
// 3 288 -16 8.75 -10 -25.25 8 -10 -18 12 -10
  [3,288,-16,8.75,-10,-25.25,8,-10,-18,12,-10],
// 4 288 -13.6 9.25 -10 -15 9.25 -10 -17.25 13.25 -10 -13 13.25 -10
  [4,288,-13.6,9.25,-10,-15,9.25,-10,-17.25,13.25,-10,-13,13.25,-10],
// 4 288 -5.5 6.5 -10 -10.5 7 -10 -12.5 8.75 -10 -11.5 14.5 -10
  [4,288,-5.5,6.5,-10,-10.5,7,-10,-12.5,8.75,-10,-11.5,14.5,-10],
// 3 288 -4.5 13.5 -10 -5.5 6.5 -10 -11.5 14.5 -10
  [3,288,-4.5,13.5,-10,-5.5,6.5,-10,-11.5,14.5,-10],
// 4 288 -4 8.5 -10 -3.25 14.75 -10 8.25 14.5 -10 8.5 13.5 -10
  [4,288,-4,8.5,-10,-3.25,14.75,-10,8.25,14.5,-10,8.5,13.5,-10],
// 4 288 9.5 12 -10 10.25 14.5 -10 17.25 13.25 -10 15 8.25 -10
  [4,288,9.5,12,-10,10.25,14.5,-10,17.25,13.25,-10,15,8.25,-10],
// 3 288 18.5 9.25 -10 15 8.25 -10 17.25 13.25 -10
  [3,288,18.5,9.25,-10,15,8.25,-10,17.25,13.25,-10],
// 4 288 21.5 8.5 -10 19.5 9.5 -10 18.75 13 -10 22.5 11.75 -10
  [4,288,21.5,8.5,-10,19.5,9.5,-10,18.75,13,-10,22.5,11.75,-10],
// 3 288 22.5 8.5 -10 23.25 11.5 -10 26.5 7.75 -10
  [3,288,22.5,8.5,-10,23.25,11.5,-10,26.5,7.75,-10],
// 4 288 -25.75 4.25 -10 -29 2 -10 -39.5 .5 -10 -26.25 7 -10
  [4,288,-25.75,4.25,-10,-29,2,-10,-39.5,.5,-10,-26.25,7,-10],
// 4 288 -22 4.5 -10 -25.75 4.25 -10 -26.25 7 -10 -14 7.75 -10
  [4,288,-22,4.5,-10,-25.75,4.25,-10,-26.25,7,-10,-14,7.75,-10],
// 4 288 -22 4.5 -10 -14 7.75 -10 -11.75 5.75 -10 -20.25 2.5 -10
  [4,288,-22,4.5,-10,-14,7.75,-10,-11.75,5.75,-10,-20.25,2.5,-10],
// 4 288 -3.75 5.25 -10 -1.75 2.5 -10 -20.25 2.5 -10 -11.75 5.75 -10
  [4,288,-3.75,5.25,-10,-1.75,2.5,-10,-20.25,2.5,-10,-11.75,5.75,-10],
// 4 288 1.25 3.5 -10 -1.75 2.5 -10 -3.75 5.25 -10 -3.5 7.25 -10
  [4,288,1.25,3.5,-10,-1.75,2.5,-10,-3.75,5.25,-10,-3.5,7.25,-10],
// 4 288 2.75 4.25 -10 1.25 3.5 -10 -3.5 7.25 -10 3.75 6 -10
  [4,288,2.75,4.25,-10,1.25,3.5,-10,-3.5,7.25,-10,3.75,6,-10],
// 4 288 4 2.75 -10 1.25 3.5 -10 2.75 4.25 -10 6.5 3.25 -10
  [4,288,4,2.75,-10,1.25,3.5,-10,2.75,4.25,-10,6.5,3.25,-10],
// 4 288 8.25 6.75 -10 3.75 6 -10 -3.5 7.25 -10 8 11.75 -10
  [4,288,8.25,6.75,-10,3.75,6,-10,-3.5,7.25,-10,8,11.75,-10],
// 4 288 8.25 6.75 -10 8 11.75 -10 14.5 6.75 -10 9.75 5 -10
  [4,288,8.25,6.75,-10,8,11.75,-10,14.5,6.75,-10,9.75,5,-10],
// 4 288 9.75 5 -10 14.5 6.75 -10 21 3.5 -10 6.5 3.25 -10
  [4,288,9.75,5,-10,14.5,6.75,-10,21,3.5,-10,6.5,3.25,-10],
// 3 288 21 3.5 -10 14.5 6.75 -10 18.25 8 -10
  [3,288,21,3.5,-10,14.5,6.75,-10,18.25,8,-10],
// 4 288 26.25 7 -10 26 4.5 -10 21 3.5 -10 18.25 8 -10
  [4,288,26.25,7,-10,26,4.5,-10,21,3.5,-10,18.25,8,-10],
// 4 288 39.5 .5 -10 29 2.5 -10 26 4.5 -10 26.25 7 -10
  [4,288,39.5,.5,-10,29,2.5,-10,26,4.5,-10,26.25,7,-10],
// 3 288 29 2.5 -10 39.5 .5 -10 22.25 2.25 -10
  [3,288,29,2.5,-10,39.5,.5,-10,22.25,2.25,-10],
// 4 288 22.25 2.25 -10 39.5 .5 -10 1 1.75 -10 4 2.75 -10
  [4,288,22.25,2.25,-10,39.5,.5,-10,1,1.75,-10,4,2.75,-10],
// 4 288 22.25 2.25 -10 4 2.75 -10 6.5 3.25 -10 21 3.5 -10
  [4,288,22.25,2.25,-10,4,2.75,-10,6.5,3.25,-10,21,3.5,-10],
// 3 288 -1.75 2.5 -10 1 1.75 -10 -20.25 2.5 -10
  [3,288,-1.75,2.5,-10,1,1.75,-10,-20.25,2.5,-10],
// 4 288 -39.5 .5 -10 -29 2 -10 -20.25 2.5 -10 1 1.75 -10
  [4,288,-39.5,.5,-10,-29,2,-10,-20.25,2.5,-10,1,1.75,-10],
// 3 288 -39.5 .5 -10 1 1.75 -10 39.5 .5 -10
  [3,288,-39.5,.5,-10,1,1.75,-10,39.5,.5,-10],
// 4 16 -29 2 -10 -25.75 4.25 -10 -22 4.5 -10 -20.25 2.5 -10
  [4,16,-29,2,-10,-25.75,4.25,-10,-22,4.5,-10,-20.25,2.5,-10],
// 4 16 1.25 3.5 -10 4 2.75 -10 1 1.75 -10 -1.75 2.5 -10
  [4,16,1.25,3.5,-10,4,2.75,-10,1,1.75,-10,-1.75,2.5,-10],
// 4 16 2.75 4.25 -10 3.75 6 -10 8.25 6.75 -10 9.75 5 -10
  [4,16,2.75,4.25,-10,3.75,6,-10,8.25,6.75,-10,9.75,5,-10],
// 3 16 6.5 3.25 -10 2.75 4.25 -10 9.75 5 -10
  [3,16,6.5,3.25,-10,2.75,4.25,-10,9.75,5,-10],
// 4 16 29 2.5 -10 22.25 2.25 -10 21 3.5 -10 26 4.5 -10
  [4,16,29,2.5,-10,22.25,2.25,-10,21,3.5,-10,26,4.5,-10],
// 4 16 -26.25 7 -10 -25.25 8 -10 -16 8.75 -10 -14 7.75 -10
  [4,16,-26.25,7,-10,-25.25,8,-10,-16,8.75,-10,-14,7.75,-10],
// 4 16 -16 8.75 -10 -18 12 -10 -17.25 13.25 -10 -15 9.25 -10
  [4,16,-16,8.75,-10,-18,12,-10,-17.25,13.25,-10,-15,9.25,-10],
// 4 16 -16 8.75 -10 -15 9.25 -10 -13.6 9.25 -10 -14 7.75 -10
  [4,16,-16,8.75,-10,-15,9.25,-10,-13.6,9.25,-10,-14,7.75,-10],
// 3 16 -14 7.75 -10 -13.6 9.25 -10 -12.5 8.75 -10
  [3,16,-14,7.75,-10,-13.6,9.25,-10,-12.5,8.75,-10],
// 4 16 -13.6 9.25 -10 -13 13.25 -10 -11.5 14.5 -10 -12.5 8.75 -10
  [4,16,-13.6,9.25,-10,-13,13.25,-10,-11.5,14.5,-10,-12.5,8.75,-10],
// 4 16 -11.75 5.75 -10 -14 7.75 -10 -12.5 8.75 -10 -10.5 7 -10
  [4,16,-11.75,5.75,-10,-14,7.75,-10,-12.5,8.75,-10,-10.5,7,-10],
// 4 16 -11.75 5.75 -10 -10.5 7 -10 -5.5 6.5 -10 -3.75 5.25 -10
  [4,16,-11.75,5.75,-10,-10.5,7,-10,-5.5,6.5,-10,-3.75,5.25,-10],
// 4 16 -3.5 7.25 -10 -3.75 5.25 -10 -5.5 6.5 -10 -4 8.5 -10
  [4,16,-3.5,7.25,-10,-3.75,5.25,-10,-5.5,6.5,-10,-4,8.5,-10],
// 4 16 -4 8.5 -10 -5.5 6.5 -10 -4.5 13.5 -10 -3.25 14.75 -10
  [4,16,-4,8.5,-10,-5.5,6.5,-10,-4.5,13.5,-10,-3.25,14.75,-10],
// 4 16 -40 24 -10 -3.25 14.75 -10 -4.5 13.5 -10 -11.5 14.5 -10
  [4,16,-40,24,-10,-3.25,14.75,-10,-4.5,13.5,-10,-11.5,14.5,-10],
// 4 16 -3.5 7.25 -10 -4 8.5 -10 8.5 13.5 -10 8 11.75 -10
  [4,16,-3.5,7.25,-10,-4,8.5,-10,8.5,13.5,-10,8,11.75,-10],
// 4 16 8 11.75 -10 8.5 13.5 -10 10.25 14.5 -10 9.5 12 -10
  [4,16,8,11.75,-10,8.5,13.5,-10,10.25,14.5,-10,9.5,12,-10],
// 3 16 10.25 14.5 -10 8.5 13.5 -10 8.25 14.5 -10
  [3,16,10.25,14.5,-10,8.5,13.5,-10,8.25,14.5,-10],
// 4 16 8 11.75 -10 9.5 12 -10 15 8.25 -10 14.5 6.75 -10
  [4,16,8,11.75,-10,9.5,12,-10,15,8.25,-10,14.5,6.75,-10],
// 4 16 14.5 6.75 -10 15 8.25 -10 18.5 9.25 -10 18.25 8 -10
  [4,16,14.5,6.75,-10,15,8.25,-10,18.5,9.25,-10,18.25,8,-10],
// 4 16 18.25 8 -10 18.5 9.25 -10 19.5 9.5 -10 21.5 8.5 -10
  [4,16,18.25,8,-10,18.5,9.25,-10,19.5,9.5,-10,21.5,8.5,-10],
// 4 16 18.75 13 -10 19.5 9.5 -10 18.5 9.25 -10 17.25 13.25 -10
  [4,16,18.75,13,-10,19.5,9.5,-10,18.5,9.25,-10,17.25,13.25,-10],
// 4 16 18.25 8 -10 21.5 8.5 -10 22.5 8.5 -10 26.25 7 -10
  [4,16,18.25,8,-10,21.5,8.5,-10,22.5,8.5,-10,26.25,7,-10],
// 4 16 23.25 11.5 -10 22.5 8.5 -10 21.5 8.5 -10 22.5 11.75 -10
  [4,16,23.25,11.5,-10,22.5,8.5,-10,21.5,8.5,-10,22.5,11.75,-10],
// 3 16 26.5 7.75 -10 26.25 7 -10 22.5 8.5 -10
  [3,16,26.5,7.75,-10,26.25,7,-10,22.5,8.5,-10],
// 3 16 39.5 .5 -10 26.25 7 -10 26.5 7.75 -10
  [3,16,39.5,.5,-10,26.25,7,-10,26.5,7.75,-10],
// 3 16 40 24 -10 40 0 -10 39.5 .5 -10
  [3,16,40,24,-10,40,0,-10,39.5,.5,-10],
// 4 16 26.5 7.75 -10 23.25 11.5 -10 40 24 -10 39.5 .5 -10
  [4,16,26.5,7.75,-10,23.25,11.5,-10,40,24,-10,39.5,.5,-10],
// 3 16 40 24 -10 23.25 11.5 -10 22.5 11.75 -10
  [3,16,40,24,-10,23.25,11.5,-10,22.5,11.75,-10],
// 3 16 40 24 -10 22.5 11.75 -10 18.75 13 -10
  [3,16,40,24,-10,22.5,11.75,-10,18.75,13,-10],
// 4 16 18.75 13 -10 17.25 13.25 -10 10.25 14.5 -10 40 24 -10
  [4,16,18.75,13,-10,17.25,13.25,-10,10.25,14.5,-10,40,24,-10],
// 4 16 40 24 -10 10.25 14.5 -10 8.25 14.5 -10 -40 24 -10
  [4,16,40,24,-10,10.25,14.5,-10,8.25,14.5,-10,-40,24,-10],
// 3 16 -40 24 -10 8.25 14.5 -10 -3.25 14.75 -10
  [3,16,-40,24,-10,8.25,14.5,-10,-3.25,14.75,-10],
// 4 16 -13 13.25 -10 -17.25 13.25 -10 -40 24 -10 -11.5 14.5 -10
  [4,16,-13,13.25,-10,-17.25,13.25,-10,-40,24,-10,-11.5,14.5,-10],
// 4 16 -25.25 8 -10 -40 24 -10 -17.25 13.25 -10 -18 12 -10
  [4,16,-25.25,8,-10,-40,24,-10,-17.25,13.25,-10,-18,12,-10],
// 4 16 -25.25 8 -10 -26.25 7 -10 -39.5 .5 -10 -40 24 -10
  [4,16,-25.25,8,-10,-26.25,7,-10,-39.5,.5,-10,-40,24,-10],
// 3 16 -40 24 -10 -39.5 .5 -10 -40 0 -10
  [3,16,-40,24,-10,-39.5,.5,-10,-40,0,-10],
// 4 16 -39.5 .5 -10 39.5 .5 -10 40 0 -10 -40 0 -10
  [4,16,-39.5,.5,-10,39.5,.5,-10,40,0,-10,-40,0,-10],
];
module ldraw_lib__3010py1(step=0, col=false, unit=2/5, alt=false, line=0.2, solid=!$preview)
    makepoly(ldraw_lib__3010py1(), step=step, col=col, unit=unit, alt=alt, line=line, solid=solid);
ldraw_lib__3010py1(line=0.2);
